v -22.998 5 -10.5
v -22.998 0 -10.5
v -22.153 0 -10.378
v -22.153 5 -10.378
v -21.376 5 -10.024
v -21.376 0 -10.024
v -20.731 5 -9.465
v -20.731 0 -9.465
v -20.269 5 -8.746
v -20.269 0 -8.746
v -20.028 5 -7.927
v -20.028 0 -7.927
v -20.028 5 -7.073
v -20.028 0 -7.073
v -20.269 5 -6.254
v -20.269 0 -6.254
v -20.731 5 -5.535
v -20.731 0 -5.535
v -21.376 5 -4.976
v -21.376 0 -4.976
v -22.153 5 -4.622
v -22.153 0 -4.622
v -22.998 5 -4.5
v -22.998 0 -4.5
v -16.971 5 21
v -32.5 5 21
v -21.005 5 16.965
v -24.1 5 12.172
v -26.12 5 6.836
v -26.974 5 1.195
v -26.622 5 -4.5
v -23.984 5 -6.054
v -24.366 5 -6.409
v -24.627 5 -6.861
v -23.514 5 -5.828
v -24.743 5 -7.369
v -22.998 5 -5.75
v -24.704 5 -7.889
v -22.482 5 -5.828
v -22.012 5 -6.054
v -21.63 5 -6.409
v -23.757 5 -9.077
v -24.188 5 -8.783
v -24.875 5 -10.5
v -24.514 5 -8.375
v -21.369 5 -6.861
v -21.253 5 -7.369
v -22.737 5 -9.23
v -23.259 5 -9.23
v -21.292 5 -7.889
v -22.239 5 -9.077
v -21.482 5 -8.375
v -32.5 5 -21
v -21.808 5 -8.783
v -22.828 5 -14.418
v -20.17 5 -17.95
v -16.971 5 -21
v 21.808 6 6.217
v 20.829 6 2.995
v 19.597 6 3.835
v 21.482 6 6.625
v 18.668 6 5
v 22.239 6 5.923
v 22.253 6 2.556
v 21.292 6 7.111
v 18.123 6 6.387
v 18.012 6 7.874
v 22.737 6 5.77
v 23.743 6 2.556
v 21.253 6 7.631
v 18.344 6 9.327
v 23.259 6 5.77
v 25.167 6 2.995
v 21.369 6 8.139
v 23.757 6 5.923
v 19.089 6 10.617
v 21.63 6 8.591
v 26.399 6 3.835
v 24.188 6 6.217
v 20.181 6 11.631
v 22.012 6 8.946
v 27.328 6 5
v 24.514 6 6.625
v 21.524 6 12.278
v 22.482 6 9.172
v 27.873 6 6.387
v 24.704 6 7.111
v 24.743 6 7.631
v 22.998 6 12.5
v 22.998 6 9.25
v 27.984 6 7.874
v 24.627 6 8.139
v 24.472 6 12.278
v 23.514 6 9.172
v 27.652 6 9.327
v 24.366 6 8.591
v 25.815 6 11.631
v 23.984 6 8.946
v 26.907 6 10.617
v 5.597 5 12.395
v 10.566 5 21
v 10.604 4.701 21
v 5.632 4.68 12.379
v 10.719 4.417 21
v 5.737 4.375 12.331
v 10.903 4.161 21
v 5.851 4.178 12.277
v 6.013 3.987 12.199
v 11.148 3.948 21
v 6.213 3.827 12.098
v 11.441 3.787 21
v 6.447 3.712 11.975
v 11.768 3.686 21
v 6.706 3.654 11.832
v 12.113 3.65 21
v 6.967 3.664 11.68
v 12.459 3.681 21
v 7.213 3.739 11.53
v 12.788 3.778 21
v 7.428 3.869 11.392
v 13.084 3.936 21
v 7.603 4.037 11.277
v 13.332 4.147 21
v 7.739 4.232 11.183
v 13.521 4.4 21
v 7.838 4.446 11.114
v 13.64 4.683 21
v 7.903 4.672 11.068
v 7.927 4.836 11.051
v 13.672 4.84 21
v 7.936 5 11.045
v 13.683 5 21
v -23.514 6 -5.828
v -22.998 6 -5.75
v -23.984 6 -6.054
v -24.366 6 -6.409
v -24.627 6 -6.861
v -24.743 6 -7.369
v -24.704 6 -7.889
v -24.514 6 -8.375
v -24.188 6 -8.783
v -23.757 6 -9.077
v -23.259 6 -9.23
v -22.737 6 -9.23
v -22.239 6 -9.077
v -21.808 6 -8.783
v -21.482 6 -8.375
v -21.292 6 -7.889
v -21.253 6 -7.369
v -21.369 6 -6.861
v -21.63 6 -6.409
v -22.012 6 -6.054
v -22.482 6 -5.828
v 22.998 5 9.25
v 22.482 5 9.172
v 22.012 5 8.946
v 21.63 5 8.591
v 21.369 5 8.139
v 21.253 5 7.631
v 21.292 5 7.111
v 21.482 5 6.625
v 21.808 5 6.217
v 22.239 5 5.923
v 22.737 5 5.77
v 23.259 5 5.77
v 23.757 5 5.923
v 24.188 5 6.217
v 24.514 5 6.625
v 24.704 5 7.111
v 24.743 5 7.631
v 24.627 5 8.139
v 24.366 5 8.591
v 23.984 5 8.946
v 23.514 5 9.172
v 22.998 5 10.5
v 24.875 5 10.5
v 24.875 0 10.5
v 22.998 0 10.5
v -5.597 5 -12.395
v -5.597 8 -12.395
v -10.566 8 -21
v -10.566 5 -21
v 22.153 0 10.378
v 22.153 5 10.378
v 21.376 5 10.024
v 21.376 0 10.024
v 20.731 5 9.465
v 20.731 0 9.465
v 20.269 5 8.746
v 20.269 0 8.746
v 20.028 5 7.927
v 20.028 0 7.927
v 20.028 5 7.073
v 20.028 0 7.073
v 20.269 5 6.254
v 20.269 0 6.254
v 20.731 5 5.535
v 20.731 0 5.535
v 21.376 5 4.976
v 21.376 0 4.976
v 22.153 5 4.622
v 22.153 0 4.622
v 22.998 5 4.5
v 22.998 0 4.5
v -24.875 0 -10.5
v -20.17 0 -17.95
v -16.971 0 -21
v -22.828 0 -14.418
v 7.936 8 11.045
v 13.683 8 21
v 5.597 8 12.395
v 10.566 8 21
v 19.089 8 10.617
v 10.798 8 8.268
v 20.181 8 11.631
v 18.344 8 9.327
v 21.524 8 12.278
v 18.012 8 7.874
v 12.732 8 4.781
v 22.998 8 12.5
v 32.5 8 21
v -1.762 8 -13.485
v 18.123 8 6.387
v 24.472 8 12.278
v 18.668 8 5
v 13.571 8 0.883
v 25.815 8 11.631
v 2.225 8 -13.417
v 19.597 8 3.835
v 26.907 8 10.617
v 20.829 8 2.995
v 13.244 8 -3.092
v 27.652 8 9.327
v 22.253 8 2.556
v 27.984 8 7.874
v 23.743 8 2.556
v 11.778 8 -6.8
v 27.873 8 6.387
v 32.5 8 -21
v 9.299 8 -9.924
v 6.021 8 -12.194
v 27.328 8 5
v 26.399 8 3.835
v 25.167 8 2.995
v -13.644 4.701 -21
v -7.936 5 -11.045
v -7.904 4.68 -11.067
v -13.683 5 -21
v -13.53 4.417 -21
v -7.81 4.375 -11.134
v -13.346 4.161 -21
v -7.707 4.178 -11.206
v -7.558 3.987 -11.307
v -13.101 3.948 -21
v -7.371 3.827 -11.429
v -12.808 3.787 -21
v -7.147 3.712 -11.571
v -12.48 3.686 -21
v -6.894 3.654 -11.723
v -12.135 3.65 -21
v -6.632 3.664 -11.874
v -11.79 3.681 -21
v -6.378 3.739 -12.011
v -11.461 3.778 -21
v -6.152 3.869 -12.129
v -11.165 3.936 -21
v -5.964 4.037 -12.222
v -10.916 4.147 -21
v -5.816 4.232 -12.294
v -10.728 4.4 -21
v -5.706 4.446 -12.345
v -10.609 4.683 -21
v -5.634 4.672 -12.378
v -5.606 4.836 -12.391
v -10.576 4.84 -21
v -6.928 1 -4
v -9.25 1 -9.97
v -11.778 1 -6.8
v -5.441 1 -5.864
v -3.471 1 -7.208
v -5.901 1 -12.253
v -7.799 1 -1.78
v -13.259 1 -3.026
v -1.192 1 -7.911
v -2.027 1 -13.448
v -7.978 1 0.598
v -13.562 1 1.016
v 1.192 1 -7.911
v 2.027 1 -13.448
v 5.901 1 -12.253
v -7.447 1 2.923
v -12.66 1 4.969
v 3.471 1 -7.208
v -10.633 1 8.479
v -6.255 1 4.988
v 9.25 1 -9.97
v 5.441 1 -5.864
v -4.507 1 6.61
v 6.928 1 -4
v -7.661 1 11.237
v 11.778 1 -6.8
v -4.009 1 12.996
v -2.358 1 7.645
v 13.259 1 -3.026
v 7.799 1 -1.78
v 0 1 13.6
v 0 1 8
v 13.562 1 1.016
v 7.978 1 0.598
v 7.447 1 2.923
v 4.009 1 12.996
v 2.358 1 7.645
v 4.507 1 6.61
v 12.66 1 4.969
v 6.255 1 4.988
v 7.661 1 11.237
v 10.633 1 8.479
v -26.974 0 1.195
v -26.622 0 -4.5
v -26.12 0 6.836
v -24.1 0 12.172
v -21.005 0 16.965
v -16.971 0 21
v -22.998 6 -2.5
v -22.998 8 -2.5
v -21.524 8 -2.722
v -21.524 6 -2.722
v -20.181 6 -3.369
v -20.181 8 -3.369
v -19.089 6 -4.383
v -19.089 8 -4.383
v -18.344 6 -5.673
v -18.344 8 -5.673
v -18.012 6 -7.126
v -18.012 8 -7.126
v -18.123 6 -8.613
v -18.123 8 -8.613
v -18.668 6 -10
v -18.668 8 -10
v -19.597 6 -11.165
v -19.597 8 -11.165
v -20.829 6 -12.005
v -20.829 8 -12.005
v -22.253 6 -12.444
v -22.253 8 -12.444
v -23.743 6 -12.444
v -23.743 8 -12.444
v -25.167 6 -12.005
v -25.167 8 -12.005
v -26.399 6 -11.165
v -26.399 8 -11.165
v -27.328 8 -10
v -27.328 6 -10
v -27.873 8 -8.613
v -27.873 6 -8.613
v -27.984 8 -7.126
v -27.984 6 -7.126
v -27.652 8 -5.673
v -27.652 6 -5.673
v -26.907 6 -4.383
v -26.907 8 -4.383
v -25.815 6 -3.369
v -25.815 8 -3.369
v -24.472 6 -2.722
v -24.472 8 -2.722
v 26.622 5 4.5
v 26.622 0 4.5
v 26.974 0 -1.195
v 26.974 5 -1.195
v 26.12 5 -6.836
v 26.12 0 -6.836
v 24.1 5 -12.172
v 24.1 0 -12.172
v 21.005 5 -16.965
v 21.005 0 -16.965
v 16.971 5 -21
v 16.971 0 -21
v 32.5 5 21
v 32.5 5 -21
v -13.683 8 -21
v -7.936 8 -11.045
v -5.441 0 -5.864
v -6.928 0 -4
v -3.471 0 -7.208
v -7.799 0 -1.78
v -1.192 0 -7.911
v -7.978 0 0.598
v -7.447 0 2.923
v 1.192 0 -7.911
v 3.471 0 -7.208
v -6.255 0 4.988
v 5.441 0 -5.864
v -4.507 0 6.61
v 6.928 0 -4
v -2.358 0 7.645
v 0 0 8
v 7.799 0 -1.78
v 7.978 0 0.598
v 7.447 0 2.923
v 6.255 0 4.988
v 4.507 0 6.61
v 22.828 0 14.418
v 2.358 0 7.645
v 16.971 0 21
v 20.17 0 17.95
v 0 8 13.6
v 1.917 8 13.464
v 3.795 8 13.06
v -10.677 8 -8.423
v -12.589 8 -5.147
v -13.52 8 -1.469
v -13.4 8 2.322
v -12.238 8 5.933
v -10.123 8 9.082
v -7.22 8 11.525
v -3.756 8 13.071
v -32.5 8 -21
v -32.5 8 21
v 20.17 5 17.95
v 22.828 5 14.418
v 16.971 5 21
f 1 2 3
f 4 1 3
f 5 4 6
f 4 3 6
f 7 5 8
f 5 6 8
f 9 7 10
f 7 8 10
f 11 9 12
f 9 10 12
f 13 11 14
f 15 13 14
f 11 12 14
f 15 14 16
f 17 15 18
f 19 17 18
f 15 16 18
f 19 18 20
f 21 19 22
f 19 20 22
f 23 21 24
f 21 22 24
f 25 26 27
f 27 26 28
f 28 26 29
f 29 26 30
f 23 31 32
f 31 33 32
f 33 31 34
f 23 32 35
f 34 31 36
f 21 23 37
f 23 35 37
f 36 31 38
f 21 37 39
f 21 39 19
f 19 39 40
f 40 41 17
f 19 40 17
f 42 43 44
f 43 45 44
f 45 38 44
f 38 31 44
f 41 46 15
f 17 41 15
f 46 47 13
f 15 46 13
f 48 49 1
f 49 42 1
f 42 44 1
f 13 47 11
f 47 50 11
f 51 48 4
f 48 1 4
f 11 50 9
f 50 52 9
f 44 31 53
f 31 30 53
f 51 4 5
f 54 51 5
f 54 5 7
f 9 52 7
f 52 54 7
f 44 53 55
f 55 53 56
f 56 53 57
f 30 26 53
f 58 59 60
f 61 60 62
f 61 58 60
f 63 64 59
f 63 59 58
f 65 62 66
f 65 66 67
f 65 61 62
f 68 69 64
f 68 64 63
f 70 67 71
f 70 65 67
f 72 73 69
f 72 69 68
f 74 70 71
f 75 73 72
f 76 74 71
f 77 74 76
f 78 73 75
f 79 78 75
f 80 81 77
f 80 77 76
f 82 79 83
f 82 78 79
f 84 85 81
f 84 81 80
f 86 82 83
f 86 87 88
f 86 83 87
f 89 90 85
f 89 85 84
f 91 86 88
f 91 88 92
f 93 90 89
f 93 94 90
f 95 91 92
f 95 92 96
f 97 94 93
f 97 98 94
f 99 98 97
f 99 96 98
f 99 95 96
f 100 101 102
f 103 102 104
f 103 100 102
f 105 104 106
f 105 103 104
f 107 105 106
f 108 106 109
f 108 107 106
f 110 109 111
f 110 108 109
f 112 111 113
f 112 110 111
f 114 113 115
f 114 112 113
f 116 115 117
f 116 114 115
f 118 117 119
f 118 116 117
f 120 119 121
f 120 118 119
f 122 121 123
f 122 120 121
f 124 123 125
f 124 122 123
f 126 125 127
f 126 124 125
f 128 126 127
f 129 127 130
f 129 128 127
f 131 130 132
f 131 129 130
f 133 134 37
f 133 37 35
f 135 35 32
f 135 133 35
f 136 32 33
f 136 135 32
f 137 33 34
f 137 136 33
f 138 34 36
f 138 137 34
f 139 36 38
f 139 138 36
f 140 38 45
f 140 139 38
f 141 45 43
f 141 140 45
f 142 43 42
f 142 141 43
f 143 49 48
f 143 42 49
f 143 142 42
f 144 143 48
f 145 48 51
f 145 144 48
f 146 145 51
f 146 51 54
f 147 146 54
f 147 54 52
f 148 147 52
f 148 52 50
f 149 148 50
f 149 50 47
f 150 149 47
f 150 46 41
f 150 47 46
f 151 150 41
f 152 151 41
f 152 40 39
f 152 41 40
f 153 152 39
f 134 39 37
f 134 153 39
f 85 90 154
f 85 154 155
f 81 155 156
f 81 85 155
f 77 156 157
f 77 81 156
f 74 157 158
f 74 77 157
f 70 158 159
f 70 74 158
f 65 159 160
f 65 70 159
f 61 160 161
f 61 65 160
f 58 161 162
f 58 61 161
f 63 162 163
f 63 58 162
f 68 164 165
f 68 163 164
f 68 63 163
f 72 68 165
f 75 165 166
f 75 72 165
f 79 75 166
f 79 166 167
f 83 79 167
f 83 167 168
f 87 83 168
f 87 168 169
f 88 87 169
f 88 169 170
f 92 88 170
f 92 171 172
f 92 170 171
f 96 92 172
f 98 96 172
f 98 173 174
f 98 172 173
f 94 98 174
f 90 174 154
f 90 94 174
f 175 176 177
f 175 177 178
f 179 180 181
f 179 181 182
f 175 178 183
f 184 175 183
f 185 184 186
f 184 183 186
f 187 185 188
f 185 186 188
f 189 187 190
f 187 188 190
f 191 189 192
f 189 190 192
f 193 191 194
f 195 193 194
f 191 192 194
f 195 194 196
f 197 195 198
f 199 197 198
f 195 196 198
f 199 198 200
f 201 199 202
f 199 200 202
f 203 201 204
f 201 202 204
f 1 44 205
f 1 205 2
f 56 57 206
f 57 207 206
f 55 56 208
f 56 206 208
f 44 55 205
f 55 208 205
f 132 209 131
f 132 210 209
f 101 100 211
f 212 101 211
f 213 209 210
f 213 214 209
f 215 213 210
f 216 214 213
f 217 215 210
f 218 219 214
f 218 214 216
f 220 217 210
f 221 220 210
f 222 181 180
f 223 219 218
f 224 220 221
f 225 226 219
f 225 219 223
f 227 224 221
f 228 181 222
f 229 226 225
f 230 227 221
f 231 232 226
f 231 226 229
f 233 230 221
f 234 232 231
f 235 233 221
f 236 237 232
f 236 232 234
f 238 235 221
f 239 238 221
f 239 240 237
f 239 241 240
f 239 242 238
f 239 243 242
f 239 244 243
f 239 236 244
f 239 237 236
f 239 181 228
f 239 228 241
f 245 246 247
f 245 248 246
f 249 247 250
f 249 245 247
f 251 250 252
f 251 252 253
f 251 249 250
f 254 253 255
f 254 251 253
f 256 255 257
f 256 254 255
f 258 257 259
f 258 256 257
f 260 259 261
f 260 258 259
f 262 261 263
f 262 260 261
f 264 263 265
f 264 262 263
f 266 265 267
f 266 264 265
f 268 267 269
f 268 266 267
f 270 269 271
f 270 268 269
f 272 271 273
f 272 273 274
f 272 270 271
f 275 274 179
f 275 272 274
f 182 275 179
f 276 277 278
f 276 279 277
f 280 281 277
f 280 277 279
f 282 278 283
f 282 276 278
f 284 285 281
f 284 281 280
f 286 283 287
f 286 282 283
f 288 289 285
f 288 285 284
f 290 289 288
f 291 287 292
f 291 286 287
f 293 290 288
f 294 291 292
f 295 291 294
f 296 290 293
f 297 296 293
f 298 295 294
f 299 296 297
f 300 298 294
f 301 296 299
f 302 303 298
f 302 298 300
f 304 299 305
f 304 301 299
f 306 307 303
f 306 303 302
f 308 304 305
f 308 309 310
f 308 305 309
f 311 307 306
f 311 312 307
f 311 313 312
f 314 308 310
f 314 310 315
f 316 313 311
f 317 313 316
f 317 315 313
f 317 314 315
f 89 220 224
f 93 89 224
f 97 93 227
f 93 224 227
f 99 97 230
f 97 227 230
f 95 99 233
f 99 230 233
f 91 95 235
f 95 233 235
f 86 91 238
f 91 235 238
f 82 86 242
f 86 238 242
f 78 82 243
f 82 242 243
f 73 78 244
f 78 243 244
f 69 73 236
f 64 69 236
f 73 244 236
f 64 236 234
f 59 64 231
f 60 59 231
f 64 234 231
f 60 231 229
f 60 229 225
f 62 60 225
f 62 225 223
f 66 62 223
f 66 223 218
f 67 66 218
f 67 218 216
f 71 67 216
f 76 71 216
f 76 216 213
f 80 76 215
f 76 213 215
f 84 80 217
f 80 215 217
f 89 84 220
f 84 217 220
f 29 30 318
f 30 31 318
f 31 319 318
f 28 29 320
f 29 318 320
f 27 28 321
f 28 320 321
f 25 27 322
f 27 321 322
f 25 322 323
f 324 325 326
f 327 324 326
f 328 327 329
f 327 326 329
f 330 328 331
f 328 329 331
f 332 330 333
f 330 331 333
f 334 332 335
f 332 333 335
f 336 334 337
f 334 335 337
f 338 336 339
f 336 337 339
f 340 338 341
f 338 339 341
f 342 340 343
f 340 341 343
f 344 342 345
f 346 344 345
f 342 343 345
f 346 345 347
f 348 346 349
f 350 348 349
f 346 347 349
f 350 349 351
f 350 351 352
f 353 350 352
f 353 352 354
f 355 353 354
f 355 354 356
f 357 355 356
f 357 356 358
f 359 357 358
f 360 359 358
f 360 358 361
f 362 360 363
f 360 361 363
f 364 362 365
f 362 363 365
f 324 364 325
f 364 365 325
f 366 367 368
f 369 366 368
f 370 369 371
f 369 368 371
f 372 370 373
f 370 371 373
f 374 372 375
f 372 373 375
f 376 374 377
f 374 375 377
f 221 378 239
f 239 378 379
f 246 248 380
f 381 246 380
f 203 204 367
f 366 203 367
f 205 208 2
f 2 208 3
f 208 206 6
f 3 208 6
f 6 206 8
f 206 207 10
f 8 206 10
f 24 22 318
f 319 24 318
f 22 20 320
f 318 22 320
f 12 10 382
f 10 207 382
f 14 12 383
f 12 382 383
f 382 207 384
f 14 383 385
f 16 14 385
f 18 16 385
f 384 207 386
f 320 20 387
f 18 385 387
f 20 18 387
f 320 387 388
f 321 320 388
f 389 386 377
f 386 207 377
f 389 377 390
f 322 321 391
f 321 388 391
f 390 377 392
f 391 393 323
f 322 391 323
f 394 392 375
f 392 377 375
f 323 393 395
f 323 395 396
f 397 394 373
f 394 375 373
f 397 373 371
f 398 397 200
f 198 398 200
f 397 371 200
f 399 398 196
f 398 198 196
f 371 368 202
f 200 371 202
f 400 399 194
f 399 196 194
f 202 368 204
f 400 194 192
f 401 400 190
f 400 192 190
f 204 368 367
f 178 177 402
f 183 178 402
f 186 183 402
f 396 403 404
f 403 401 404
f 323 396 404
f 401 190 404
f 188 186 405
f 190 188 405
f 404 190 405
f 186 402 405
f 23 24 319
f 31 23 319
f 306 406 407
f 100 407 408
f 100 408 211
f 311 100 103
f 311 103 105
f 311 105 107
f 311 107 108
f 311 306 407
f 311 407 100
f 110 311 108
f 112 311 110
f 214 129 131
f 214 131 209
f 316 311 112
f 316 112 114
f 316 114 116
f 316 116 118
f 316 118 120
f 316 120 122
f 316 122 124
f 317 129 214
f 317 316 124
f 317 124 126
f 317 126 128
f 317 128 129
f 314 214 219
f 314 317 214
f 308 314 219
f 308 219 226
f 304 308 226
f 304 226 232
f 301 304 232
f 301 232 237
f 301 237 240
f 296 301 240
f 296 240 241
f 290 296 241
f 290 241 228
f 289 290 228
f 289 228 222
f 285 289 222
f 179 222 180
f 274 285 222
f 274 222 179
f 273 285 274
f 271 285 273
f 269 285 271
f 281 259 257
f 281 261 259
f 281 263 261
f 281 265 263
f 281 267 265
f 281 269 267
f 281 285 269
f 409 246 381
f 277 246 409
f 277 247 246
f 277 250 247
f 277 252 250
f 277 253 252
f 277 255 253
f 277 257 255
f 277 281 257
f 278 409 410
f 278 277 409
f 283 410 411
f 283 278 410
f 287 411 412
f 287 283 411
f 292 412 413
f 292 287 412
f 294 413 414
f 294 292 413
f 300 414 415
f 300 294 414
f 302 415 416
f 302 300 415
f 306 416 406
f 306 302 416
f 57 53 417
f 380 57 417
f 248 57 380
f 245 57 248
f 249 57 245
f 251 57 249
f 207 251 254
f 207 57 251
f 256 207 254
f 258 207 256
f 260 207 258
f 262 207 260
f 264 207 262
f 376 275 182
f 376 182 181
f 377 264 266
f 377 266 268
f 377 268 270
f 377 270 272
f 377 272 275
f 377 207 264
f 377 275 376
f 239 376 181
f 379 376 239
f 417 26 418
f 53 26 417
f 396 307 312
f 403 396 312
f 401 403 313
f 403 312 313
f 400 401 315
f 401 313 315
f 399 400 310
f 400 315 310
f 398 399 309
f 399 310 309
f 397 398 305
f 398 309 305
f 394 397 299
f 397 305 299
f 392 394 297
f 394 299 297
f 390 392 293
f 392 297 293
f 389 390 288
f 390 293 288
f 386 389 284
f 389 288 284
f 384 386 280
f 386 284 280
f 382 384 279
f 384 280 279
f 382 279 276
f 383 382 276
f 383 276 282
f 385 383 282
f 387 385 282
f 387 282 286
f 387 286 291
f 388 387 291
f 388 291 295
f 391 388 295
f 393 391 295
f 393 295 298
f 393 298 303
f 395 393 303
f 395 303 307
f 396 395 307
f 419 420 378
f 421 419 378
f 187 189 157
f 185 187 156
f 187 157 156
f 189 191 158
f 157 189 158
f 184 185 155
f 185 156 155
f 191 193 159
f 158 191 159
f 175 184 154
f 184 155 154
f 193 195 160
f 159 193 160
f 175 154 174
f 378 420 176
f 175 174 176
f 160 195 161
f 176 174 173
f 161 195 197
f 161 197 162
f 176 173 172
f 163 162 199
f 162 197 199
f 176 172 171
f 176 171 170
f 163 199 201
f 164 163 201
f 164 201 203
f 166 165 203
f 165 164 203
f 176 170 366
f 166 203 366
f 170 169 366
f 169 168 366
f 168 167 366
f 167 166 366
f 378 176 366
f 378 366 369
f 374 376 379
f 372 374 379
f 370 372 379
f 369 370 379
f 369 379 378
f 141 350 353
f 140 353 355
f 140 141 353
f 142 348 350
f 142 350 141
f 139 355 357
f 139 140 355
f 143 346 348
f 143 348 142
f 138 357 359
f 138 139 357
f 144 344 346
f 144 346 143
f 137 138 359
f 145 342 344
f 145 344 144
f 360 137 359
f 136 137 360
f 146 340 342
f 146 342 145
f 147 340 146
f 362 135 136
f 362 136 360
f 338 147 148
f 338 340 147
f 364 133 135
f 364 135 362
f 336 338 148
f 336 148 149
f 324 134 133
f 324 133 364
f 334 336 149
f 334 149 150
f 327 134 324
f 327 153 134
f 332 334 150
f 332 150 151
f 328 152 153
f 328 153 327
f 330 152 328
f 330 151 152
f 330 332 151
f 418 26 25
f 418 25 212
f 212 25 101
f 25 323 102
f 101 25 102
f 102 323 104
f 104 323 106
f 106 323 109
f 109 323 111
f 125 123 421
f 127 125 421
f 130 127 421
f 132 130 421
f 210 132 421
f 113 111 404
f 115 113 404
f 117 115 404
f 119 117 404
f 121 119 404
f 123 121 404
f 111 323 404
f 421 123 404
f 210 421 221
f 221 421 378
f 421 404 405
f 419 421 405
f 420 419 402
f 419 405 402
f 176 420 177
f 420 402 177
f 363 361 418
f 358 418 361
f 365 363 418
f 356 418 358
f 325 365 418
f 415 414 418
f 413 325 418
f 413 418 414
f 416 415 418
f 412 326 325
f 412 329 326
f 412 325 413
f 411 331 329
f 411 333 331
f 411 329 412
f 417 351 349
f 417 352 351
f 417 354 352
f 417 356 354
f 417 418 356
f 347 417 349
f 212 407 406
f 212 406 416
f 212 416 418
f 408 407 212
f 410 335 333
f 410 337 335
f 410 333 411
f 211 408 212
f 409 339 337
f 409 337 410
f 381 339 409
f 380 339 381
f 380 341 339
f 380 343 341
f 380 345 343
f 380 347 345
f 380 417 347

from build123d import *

# Parameters (mm, degrees)
SCHIZZO1_R                        = 27
ESTRUSIONE_ESTRUSIONE1_DEPTH      = 1
SCHIZZO2_R                        = 8
TAGLIO_ESTRUSIONE1_DEPTH          = 39.19685851
SCHIZZO3_R                        = 27
SCHIZZO3_R_2                      = 13.6
ESTRUSIONE_ESTRUSIONE2_DEPTH      = 5
ESTRUSIONE_ESTRUSIONE3_DEPTH      = 2
ESTRUSIONE_ESTRUSIONE3_DEPTH_BACK = 1
SCHIZZO5_W                        = 65
SCHIZZO5_H                        = 42
SCHIZZO5_R                        = 13.6
TAGLIO_ESTRUSIONE2_START          = -27
TAGLIO_ESTRUSIONE2_OUTLINE_R      = 1.35
TAGLIO_ESTRUSIONE2_DEPTH          = 53.999999754
TAGLIO_ESTRUSIONE3_DEPTH          = 44.869308585
TAGLIO_ESTRUSIONE3_DEPTH_BACK     = 44.869308585
SCHIZZO8_W                        = 81.46070362
SCHIZZO8_H                        = 59.010327036
SCHIZZO8_W_2                      = 65
SCHIZZO8_H_2                      = 42
TAGLIO_ESTRUSIONE5_DEPTH          = 43.676105804
TAGLIO_ESTRUSIONE6_DEPTH          = 5
SCHIZZO13_R                       = 5
TAGLIO_ESTRUSIONE8_DEPTH          = 2
TAGLIO_ESTRUSIONE9_DEPTH          = 63.725779509
TAGLIO_ESTRUSIONE9_DEPTH_BACK     = 63.725779509
SCHIZZO3D3_R                      = 1.75


# Read off the part's stored shape, not the designer's step: Taglio-Estrusione2
with BuildPart() as part:
    # Schizzo1 → Estrusione-Estrusione1 (new body)
    with BuildSketch(Plane(origin=(0, 0, 0), x_dir=(1, 0, 0), z_dir=(0, 1, 0))):
        with Locations(Location((0, 0, 0), (0, 0, 270))):
            Circle(SCHIZZO1_R)
    extrude(amount=ESTRUSIONE_ESTRUSIONE1_DEPTH)

    # Schizzo2 → Taglio-Estrusione1 (cut, through all)
    with BuildSketch(Plane(origin=(0, 1, 0), x_dir=(1, 0, 0), z_dir=(0, 1, 0))):
        with Locations(Location((0, 0, 0), (0, 0, 270))):
            Circle(SCHIZZO2_R)
    extrude(amount=-TAGLIO_ESTRUSIONE1_DEPTH, mode=Mode.SUBTRACT)

    # Schizzo3 → Estrusione-Estrusione2 (add)
    with BuildSketch(Plane(origin=(0, 1, 0), x_dir=(1, 0, 0), z_dir=(0, 1, 0))):
        with Locations(Location((0, 0, 0), (0, 0, 270))):
            Circle(SCHIZZO3_R)
        with Locations(Location((0, 0, 0), (0, 0, 270))):
            Circle(SCHIZZO3_R_2, mode=Mode.SUBTRACT)
    extrude(amount=ESTRUSIONE_ESTRUSIONE2_DEPTH)

    # Schizzo5 → Estrusione-Estrusione3 (add, two sides: drawn at the far end of the back side and taken through both)
    with BuildSketch(Plane(origin=(0, 6, 0), x_dir=(1, 0, 0), z_dir=(0, 1, 0)).offset(-ESTRUSIONE_ESTRUSIONE3_DEPTH_BACK)):
        Rectangle(SCHIZZO5_W, SCHIZZO5_H)
        with Locations(Location((0, 0, 0), (0, 0, 270))):
            Circle(SCHIZZO5_R, mode=Mode.SUBTRACT)
    extrude(amount=ESTRUSIONE_ESTRUSIONE3_DEPTH + ESTRUSIONE_ESTRUSIONE3_DEPTH_BACK)

    # Taglio-Estrusione2 outline → Taglio-Estrusione2 (cut)
    with BuildSketch(Plane(origin=(0, 0, 0), x_dir=(0.866025403784438, 0, -0.500000000000001), z_dir=(0.500000000000001, 0, 0.866025403784438)).offset(TAGLIO_ESTRUSIONE2_START)):
        with Locations((0, 5)):
            Circle(TAGLIO_ESTRUSIONE2_OUTLINE_R)
    extrude(amount=TAGLIO_ESTRUSIONE2_DEPTH, mode=Mode.SUBTRACT)

    # Schizzo3D2 → Taglio-Estrusione3 (cut, two sides: drawn at the far end of the back side and taken through both)
    with BuildSketch(Plane(origin=(1.169134295, 5, -0.675), x_dir=(-0.41149103074101084, 0.8799053976571924, 0.23757445736745078), z_dir=(-0.5000000000000011, 1.0747888534457561e-14, -0.866025403784438)).offset(-TAGLIO_ESTRUSIONE3_DEPTH_BACK)):
        Polygon((0, 0), (1.28290207, -2.375744574), (5.682429058, 0), (4.399526988, 2.375744574), align=None)
    extrude(amount=TAGLIO_ESTRUSIONE3_DEPTH + TAGLIO_ESTRUSIONE3_DEPTH_BACK, mode=Mode.SUBTRACT)

    # Schizzo8 → Taglio-Estrusione5 (cut, through all)
    with BuildSketch(Plane(origin=(0, 6, 0), x_dir=(1, 0, 0), z_dir=(0, 1, 0))):
        Rectangle(SCHIZZO8_W, SCHIZZO8_H)
        Rectangle(SCHIZZO8_W_2, SCHIZZO8_H_2, mode=Mode.SUBTRACT)
    extrude(amount=-TAGLIO_ESTRUSIONE5_DEPTH, mode=Mode.SUBTRACT)

    # Schizzo9 → Taglio-Estrusione6 (cut)
    with BuildSketch(Plane.XZ):
        with BuildLine():
            Line((-22.997958605, -4.5), (-26.622359024, -4.5))
            Line((-26.622359024, -4.5), (-26.622359024, -10.5))
            Line((-26.622359024, -10.5), (-22.997958605, -10.5))
            ThreePointArc((-22.997958605, -10.5), (-19.997958605, -7.5), (-22.997958605, -4.5))
        make_face()
        with BuildLine():
            Line((22.997958605, 4.5), (27.800743069, 4.5))
            Line((27.800743069, 4.5), (27.800743069, 10.5))
            Line((27.800743069, 10.5), (22.997958605, 10.5))
            ThreePointArc((22.997958605, 10.5), (19.997958605, 7.5), (22.997958605, 4.5))
        make_face()
    extrude(amount=-TAGLIO_ESTRUSIONE6_DEPTH, mode=Mode.SUBTRACT)

    # Schizzo13 → Taglio-Estrusione8 (cut)
    with BuildSketch(Plane(origin=(0, 8, 0), x_dir=(1, 0, 0), z_dir=(0, 1, 0))):
        with Locations(Location((-22.997958605, 7.5, 0), (0, 0, 270))):
            Circle(SCHIZZO13_R)
        with Locations(Location((22.997958605, -7.5, 0), (0, 0, 270))):
            Circle(SCHIZZO13_R)
    extrude(amount=-TAGLIO_ESTRUSIONE8_DEPTH, mode=Mode.SUBTRACT)

    # Schizzo3D3 → Taglio-Estrusione9 (cut, two sides: drawn at the far end of the back side and taken through both)
    with BuildSketch(Plane(origin=(-22.997958605, 6.5, -7.5), x_dir=(0.9507217281959008, 0, 0.3100454733360893), z_dir=(0, -1, 0)).offset(-TAGLIO_ESTRUSIONE9_DEPTH_BACK)):
        with Locations(Location((0, 0, 0), (0, 0, 71.938029054))):
            Circle(SCHIZZO3D3_R)
        with Locations(Location((48.38, 0, 0), (0, 0, 71.938029054))):
            Circle(SCHIZZO3D3_R)
    extrude(amount=TAGLIO_ESTRUSIONE9_DEPTH + TAGLIO_ESTRUSIONE9_DEPTH_BACK, mode=Mode.SUBTRACT)


solid = part.part
